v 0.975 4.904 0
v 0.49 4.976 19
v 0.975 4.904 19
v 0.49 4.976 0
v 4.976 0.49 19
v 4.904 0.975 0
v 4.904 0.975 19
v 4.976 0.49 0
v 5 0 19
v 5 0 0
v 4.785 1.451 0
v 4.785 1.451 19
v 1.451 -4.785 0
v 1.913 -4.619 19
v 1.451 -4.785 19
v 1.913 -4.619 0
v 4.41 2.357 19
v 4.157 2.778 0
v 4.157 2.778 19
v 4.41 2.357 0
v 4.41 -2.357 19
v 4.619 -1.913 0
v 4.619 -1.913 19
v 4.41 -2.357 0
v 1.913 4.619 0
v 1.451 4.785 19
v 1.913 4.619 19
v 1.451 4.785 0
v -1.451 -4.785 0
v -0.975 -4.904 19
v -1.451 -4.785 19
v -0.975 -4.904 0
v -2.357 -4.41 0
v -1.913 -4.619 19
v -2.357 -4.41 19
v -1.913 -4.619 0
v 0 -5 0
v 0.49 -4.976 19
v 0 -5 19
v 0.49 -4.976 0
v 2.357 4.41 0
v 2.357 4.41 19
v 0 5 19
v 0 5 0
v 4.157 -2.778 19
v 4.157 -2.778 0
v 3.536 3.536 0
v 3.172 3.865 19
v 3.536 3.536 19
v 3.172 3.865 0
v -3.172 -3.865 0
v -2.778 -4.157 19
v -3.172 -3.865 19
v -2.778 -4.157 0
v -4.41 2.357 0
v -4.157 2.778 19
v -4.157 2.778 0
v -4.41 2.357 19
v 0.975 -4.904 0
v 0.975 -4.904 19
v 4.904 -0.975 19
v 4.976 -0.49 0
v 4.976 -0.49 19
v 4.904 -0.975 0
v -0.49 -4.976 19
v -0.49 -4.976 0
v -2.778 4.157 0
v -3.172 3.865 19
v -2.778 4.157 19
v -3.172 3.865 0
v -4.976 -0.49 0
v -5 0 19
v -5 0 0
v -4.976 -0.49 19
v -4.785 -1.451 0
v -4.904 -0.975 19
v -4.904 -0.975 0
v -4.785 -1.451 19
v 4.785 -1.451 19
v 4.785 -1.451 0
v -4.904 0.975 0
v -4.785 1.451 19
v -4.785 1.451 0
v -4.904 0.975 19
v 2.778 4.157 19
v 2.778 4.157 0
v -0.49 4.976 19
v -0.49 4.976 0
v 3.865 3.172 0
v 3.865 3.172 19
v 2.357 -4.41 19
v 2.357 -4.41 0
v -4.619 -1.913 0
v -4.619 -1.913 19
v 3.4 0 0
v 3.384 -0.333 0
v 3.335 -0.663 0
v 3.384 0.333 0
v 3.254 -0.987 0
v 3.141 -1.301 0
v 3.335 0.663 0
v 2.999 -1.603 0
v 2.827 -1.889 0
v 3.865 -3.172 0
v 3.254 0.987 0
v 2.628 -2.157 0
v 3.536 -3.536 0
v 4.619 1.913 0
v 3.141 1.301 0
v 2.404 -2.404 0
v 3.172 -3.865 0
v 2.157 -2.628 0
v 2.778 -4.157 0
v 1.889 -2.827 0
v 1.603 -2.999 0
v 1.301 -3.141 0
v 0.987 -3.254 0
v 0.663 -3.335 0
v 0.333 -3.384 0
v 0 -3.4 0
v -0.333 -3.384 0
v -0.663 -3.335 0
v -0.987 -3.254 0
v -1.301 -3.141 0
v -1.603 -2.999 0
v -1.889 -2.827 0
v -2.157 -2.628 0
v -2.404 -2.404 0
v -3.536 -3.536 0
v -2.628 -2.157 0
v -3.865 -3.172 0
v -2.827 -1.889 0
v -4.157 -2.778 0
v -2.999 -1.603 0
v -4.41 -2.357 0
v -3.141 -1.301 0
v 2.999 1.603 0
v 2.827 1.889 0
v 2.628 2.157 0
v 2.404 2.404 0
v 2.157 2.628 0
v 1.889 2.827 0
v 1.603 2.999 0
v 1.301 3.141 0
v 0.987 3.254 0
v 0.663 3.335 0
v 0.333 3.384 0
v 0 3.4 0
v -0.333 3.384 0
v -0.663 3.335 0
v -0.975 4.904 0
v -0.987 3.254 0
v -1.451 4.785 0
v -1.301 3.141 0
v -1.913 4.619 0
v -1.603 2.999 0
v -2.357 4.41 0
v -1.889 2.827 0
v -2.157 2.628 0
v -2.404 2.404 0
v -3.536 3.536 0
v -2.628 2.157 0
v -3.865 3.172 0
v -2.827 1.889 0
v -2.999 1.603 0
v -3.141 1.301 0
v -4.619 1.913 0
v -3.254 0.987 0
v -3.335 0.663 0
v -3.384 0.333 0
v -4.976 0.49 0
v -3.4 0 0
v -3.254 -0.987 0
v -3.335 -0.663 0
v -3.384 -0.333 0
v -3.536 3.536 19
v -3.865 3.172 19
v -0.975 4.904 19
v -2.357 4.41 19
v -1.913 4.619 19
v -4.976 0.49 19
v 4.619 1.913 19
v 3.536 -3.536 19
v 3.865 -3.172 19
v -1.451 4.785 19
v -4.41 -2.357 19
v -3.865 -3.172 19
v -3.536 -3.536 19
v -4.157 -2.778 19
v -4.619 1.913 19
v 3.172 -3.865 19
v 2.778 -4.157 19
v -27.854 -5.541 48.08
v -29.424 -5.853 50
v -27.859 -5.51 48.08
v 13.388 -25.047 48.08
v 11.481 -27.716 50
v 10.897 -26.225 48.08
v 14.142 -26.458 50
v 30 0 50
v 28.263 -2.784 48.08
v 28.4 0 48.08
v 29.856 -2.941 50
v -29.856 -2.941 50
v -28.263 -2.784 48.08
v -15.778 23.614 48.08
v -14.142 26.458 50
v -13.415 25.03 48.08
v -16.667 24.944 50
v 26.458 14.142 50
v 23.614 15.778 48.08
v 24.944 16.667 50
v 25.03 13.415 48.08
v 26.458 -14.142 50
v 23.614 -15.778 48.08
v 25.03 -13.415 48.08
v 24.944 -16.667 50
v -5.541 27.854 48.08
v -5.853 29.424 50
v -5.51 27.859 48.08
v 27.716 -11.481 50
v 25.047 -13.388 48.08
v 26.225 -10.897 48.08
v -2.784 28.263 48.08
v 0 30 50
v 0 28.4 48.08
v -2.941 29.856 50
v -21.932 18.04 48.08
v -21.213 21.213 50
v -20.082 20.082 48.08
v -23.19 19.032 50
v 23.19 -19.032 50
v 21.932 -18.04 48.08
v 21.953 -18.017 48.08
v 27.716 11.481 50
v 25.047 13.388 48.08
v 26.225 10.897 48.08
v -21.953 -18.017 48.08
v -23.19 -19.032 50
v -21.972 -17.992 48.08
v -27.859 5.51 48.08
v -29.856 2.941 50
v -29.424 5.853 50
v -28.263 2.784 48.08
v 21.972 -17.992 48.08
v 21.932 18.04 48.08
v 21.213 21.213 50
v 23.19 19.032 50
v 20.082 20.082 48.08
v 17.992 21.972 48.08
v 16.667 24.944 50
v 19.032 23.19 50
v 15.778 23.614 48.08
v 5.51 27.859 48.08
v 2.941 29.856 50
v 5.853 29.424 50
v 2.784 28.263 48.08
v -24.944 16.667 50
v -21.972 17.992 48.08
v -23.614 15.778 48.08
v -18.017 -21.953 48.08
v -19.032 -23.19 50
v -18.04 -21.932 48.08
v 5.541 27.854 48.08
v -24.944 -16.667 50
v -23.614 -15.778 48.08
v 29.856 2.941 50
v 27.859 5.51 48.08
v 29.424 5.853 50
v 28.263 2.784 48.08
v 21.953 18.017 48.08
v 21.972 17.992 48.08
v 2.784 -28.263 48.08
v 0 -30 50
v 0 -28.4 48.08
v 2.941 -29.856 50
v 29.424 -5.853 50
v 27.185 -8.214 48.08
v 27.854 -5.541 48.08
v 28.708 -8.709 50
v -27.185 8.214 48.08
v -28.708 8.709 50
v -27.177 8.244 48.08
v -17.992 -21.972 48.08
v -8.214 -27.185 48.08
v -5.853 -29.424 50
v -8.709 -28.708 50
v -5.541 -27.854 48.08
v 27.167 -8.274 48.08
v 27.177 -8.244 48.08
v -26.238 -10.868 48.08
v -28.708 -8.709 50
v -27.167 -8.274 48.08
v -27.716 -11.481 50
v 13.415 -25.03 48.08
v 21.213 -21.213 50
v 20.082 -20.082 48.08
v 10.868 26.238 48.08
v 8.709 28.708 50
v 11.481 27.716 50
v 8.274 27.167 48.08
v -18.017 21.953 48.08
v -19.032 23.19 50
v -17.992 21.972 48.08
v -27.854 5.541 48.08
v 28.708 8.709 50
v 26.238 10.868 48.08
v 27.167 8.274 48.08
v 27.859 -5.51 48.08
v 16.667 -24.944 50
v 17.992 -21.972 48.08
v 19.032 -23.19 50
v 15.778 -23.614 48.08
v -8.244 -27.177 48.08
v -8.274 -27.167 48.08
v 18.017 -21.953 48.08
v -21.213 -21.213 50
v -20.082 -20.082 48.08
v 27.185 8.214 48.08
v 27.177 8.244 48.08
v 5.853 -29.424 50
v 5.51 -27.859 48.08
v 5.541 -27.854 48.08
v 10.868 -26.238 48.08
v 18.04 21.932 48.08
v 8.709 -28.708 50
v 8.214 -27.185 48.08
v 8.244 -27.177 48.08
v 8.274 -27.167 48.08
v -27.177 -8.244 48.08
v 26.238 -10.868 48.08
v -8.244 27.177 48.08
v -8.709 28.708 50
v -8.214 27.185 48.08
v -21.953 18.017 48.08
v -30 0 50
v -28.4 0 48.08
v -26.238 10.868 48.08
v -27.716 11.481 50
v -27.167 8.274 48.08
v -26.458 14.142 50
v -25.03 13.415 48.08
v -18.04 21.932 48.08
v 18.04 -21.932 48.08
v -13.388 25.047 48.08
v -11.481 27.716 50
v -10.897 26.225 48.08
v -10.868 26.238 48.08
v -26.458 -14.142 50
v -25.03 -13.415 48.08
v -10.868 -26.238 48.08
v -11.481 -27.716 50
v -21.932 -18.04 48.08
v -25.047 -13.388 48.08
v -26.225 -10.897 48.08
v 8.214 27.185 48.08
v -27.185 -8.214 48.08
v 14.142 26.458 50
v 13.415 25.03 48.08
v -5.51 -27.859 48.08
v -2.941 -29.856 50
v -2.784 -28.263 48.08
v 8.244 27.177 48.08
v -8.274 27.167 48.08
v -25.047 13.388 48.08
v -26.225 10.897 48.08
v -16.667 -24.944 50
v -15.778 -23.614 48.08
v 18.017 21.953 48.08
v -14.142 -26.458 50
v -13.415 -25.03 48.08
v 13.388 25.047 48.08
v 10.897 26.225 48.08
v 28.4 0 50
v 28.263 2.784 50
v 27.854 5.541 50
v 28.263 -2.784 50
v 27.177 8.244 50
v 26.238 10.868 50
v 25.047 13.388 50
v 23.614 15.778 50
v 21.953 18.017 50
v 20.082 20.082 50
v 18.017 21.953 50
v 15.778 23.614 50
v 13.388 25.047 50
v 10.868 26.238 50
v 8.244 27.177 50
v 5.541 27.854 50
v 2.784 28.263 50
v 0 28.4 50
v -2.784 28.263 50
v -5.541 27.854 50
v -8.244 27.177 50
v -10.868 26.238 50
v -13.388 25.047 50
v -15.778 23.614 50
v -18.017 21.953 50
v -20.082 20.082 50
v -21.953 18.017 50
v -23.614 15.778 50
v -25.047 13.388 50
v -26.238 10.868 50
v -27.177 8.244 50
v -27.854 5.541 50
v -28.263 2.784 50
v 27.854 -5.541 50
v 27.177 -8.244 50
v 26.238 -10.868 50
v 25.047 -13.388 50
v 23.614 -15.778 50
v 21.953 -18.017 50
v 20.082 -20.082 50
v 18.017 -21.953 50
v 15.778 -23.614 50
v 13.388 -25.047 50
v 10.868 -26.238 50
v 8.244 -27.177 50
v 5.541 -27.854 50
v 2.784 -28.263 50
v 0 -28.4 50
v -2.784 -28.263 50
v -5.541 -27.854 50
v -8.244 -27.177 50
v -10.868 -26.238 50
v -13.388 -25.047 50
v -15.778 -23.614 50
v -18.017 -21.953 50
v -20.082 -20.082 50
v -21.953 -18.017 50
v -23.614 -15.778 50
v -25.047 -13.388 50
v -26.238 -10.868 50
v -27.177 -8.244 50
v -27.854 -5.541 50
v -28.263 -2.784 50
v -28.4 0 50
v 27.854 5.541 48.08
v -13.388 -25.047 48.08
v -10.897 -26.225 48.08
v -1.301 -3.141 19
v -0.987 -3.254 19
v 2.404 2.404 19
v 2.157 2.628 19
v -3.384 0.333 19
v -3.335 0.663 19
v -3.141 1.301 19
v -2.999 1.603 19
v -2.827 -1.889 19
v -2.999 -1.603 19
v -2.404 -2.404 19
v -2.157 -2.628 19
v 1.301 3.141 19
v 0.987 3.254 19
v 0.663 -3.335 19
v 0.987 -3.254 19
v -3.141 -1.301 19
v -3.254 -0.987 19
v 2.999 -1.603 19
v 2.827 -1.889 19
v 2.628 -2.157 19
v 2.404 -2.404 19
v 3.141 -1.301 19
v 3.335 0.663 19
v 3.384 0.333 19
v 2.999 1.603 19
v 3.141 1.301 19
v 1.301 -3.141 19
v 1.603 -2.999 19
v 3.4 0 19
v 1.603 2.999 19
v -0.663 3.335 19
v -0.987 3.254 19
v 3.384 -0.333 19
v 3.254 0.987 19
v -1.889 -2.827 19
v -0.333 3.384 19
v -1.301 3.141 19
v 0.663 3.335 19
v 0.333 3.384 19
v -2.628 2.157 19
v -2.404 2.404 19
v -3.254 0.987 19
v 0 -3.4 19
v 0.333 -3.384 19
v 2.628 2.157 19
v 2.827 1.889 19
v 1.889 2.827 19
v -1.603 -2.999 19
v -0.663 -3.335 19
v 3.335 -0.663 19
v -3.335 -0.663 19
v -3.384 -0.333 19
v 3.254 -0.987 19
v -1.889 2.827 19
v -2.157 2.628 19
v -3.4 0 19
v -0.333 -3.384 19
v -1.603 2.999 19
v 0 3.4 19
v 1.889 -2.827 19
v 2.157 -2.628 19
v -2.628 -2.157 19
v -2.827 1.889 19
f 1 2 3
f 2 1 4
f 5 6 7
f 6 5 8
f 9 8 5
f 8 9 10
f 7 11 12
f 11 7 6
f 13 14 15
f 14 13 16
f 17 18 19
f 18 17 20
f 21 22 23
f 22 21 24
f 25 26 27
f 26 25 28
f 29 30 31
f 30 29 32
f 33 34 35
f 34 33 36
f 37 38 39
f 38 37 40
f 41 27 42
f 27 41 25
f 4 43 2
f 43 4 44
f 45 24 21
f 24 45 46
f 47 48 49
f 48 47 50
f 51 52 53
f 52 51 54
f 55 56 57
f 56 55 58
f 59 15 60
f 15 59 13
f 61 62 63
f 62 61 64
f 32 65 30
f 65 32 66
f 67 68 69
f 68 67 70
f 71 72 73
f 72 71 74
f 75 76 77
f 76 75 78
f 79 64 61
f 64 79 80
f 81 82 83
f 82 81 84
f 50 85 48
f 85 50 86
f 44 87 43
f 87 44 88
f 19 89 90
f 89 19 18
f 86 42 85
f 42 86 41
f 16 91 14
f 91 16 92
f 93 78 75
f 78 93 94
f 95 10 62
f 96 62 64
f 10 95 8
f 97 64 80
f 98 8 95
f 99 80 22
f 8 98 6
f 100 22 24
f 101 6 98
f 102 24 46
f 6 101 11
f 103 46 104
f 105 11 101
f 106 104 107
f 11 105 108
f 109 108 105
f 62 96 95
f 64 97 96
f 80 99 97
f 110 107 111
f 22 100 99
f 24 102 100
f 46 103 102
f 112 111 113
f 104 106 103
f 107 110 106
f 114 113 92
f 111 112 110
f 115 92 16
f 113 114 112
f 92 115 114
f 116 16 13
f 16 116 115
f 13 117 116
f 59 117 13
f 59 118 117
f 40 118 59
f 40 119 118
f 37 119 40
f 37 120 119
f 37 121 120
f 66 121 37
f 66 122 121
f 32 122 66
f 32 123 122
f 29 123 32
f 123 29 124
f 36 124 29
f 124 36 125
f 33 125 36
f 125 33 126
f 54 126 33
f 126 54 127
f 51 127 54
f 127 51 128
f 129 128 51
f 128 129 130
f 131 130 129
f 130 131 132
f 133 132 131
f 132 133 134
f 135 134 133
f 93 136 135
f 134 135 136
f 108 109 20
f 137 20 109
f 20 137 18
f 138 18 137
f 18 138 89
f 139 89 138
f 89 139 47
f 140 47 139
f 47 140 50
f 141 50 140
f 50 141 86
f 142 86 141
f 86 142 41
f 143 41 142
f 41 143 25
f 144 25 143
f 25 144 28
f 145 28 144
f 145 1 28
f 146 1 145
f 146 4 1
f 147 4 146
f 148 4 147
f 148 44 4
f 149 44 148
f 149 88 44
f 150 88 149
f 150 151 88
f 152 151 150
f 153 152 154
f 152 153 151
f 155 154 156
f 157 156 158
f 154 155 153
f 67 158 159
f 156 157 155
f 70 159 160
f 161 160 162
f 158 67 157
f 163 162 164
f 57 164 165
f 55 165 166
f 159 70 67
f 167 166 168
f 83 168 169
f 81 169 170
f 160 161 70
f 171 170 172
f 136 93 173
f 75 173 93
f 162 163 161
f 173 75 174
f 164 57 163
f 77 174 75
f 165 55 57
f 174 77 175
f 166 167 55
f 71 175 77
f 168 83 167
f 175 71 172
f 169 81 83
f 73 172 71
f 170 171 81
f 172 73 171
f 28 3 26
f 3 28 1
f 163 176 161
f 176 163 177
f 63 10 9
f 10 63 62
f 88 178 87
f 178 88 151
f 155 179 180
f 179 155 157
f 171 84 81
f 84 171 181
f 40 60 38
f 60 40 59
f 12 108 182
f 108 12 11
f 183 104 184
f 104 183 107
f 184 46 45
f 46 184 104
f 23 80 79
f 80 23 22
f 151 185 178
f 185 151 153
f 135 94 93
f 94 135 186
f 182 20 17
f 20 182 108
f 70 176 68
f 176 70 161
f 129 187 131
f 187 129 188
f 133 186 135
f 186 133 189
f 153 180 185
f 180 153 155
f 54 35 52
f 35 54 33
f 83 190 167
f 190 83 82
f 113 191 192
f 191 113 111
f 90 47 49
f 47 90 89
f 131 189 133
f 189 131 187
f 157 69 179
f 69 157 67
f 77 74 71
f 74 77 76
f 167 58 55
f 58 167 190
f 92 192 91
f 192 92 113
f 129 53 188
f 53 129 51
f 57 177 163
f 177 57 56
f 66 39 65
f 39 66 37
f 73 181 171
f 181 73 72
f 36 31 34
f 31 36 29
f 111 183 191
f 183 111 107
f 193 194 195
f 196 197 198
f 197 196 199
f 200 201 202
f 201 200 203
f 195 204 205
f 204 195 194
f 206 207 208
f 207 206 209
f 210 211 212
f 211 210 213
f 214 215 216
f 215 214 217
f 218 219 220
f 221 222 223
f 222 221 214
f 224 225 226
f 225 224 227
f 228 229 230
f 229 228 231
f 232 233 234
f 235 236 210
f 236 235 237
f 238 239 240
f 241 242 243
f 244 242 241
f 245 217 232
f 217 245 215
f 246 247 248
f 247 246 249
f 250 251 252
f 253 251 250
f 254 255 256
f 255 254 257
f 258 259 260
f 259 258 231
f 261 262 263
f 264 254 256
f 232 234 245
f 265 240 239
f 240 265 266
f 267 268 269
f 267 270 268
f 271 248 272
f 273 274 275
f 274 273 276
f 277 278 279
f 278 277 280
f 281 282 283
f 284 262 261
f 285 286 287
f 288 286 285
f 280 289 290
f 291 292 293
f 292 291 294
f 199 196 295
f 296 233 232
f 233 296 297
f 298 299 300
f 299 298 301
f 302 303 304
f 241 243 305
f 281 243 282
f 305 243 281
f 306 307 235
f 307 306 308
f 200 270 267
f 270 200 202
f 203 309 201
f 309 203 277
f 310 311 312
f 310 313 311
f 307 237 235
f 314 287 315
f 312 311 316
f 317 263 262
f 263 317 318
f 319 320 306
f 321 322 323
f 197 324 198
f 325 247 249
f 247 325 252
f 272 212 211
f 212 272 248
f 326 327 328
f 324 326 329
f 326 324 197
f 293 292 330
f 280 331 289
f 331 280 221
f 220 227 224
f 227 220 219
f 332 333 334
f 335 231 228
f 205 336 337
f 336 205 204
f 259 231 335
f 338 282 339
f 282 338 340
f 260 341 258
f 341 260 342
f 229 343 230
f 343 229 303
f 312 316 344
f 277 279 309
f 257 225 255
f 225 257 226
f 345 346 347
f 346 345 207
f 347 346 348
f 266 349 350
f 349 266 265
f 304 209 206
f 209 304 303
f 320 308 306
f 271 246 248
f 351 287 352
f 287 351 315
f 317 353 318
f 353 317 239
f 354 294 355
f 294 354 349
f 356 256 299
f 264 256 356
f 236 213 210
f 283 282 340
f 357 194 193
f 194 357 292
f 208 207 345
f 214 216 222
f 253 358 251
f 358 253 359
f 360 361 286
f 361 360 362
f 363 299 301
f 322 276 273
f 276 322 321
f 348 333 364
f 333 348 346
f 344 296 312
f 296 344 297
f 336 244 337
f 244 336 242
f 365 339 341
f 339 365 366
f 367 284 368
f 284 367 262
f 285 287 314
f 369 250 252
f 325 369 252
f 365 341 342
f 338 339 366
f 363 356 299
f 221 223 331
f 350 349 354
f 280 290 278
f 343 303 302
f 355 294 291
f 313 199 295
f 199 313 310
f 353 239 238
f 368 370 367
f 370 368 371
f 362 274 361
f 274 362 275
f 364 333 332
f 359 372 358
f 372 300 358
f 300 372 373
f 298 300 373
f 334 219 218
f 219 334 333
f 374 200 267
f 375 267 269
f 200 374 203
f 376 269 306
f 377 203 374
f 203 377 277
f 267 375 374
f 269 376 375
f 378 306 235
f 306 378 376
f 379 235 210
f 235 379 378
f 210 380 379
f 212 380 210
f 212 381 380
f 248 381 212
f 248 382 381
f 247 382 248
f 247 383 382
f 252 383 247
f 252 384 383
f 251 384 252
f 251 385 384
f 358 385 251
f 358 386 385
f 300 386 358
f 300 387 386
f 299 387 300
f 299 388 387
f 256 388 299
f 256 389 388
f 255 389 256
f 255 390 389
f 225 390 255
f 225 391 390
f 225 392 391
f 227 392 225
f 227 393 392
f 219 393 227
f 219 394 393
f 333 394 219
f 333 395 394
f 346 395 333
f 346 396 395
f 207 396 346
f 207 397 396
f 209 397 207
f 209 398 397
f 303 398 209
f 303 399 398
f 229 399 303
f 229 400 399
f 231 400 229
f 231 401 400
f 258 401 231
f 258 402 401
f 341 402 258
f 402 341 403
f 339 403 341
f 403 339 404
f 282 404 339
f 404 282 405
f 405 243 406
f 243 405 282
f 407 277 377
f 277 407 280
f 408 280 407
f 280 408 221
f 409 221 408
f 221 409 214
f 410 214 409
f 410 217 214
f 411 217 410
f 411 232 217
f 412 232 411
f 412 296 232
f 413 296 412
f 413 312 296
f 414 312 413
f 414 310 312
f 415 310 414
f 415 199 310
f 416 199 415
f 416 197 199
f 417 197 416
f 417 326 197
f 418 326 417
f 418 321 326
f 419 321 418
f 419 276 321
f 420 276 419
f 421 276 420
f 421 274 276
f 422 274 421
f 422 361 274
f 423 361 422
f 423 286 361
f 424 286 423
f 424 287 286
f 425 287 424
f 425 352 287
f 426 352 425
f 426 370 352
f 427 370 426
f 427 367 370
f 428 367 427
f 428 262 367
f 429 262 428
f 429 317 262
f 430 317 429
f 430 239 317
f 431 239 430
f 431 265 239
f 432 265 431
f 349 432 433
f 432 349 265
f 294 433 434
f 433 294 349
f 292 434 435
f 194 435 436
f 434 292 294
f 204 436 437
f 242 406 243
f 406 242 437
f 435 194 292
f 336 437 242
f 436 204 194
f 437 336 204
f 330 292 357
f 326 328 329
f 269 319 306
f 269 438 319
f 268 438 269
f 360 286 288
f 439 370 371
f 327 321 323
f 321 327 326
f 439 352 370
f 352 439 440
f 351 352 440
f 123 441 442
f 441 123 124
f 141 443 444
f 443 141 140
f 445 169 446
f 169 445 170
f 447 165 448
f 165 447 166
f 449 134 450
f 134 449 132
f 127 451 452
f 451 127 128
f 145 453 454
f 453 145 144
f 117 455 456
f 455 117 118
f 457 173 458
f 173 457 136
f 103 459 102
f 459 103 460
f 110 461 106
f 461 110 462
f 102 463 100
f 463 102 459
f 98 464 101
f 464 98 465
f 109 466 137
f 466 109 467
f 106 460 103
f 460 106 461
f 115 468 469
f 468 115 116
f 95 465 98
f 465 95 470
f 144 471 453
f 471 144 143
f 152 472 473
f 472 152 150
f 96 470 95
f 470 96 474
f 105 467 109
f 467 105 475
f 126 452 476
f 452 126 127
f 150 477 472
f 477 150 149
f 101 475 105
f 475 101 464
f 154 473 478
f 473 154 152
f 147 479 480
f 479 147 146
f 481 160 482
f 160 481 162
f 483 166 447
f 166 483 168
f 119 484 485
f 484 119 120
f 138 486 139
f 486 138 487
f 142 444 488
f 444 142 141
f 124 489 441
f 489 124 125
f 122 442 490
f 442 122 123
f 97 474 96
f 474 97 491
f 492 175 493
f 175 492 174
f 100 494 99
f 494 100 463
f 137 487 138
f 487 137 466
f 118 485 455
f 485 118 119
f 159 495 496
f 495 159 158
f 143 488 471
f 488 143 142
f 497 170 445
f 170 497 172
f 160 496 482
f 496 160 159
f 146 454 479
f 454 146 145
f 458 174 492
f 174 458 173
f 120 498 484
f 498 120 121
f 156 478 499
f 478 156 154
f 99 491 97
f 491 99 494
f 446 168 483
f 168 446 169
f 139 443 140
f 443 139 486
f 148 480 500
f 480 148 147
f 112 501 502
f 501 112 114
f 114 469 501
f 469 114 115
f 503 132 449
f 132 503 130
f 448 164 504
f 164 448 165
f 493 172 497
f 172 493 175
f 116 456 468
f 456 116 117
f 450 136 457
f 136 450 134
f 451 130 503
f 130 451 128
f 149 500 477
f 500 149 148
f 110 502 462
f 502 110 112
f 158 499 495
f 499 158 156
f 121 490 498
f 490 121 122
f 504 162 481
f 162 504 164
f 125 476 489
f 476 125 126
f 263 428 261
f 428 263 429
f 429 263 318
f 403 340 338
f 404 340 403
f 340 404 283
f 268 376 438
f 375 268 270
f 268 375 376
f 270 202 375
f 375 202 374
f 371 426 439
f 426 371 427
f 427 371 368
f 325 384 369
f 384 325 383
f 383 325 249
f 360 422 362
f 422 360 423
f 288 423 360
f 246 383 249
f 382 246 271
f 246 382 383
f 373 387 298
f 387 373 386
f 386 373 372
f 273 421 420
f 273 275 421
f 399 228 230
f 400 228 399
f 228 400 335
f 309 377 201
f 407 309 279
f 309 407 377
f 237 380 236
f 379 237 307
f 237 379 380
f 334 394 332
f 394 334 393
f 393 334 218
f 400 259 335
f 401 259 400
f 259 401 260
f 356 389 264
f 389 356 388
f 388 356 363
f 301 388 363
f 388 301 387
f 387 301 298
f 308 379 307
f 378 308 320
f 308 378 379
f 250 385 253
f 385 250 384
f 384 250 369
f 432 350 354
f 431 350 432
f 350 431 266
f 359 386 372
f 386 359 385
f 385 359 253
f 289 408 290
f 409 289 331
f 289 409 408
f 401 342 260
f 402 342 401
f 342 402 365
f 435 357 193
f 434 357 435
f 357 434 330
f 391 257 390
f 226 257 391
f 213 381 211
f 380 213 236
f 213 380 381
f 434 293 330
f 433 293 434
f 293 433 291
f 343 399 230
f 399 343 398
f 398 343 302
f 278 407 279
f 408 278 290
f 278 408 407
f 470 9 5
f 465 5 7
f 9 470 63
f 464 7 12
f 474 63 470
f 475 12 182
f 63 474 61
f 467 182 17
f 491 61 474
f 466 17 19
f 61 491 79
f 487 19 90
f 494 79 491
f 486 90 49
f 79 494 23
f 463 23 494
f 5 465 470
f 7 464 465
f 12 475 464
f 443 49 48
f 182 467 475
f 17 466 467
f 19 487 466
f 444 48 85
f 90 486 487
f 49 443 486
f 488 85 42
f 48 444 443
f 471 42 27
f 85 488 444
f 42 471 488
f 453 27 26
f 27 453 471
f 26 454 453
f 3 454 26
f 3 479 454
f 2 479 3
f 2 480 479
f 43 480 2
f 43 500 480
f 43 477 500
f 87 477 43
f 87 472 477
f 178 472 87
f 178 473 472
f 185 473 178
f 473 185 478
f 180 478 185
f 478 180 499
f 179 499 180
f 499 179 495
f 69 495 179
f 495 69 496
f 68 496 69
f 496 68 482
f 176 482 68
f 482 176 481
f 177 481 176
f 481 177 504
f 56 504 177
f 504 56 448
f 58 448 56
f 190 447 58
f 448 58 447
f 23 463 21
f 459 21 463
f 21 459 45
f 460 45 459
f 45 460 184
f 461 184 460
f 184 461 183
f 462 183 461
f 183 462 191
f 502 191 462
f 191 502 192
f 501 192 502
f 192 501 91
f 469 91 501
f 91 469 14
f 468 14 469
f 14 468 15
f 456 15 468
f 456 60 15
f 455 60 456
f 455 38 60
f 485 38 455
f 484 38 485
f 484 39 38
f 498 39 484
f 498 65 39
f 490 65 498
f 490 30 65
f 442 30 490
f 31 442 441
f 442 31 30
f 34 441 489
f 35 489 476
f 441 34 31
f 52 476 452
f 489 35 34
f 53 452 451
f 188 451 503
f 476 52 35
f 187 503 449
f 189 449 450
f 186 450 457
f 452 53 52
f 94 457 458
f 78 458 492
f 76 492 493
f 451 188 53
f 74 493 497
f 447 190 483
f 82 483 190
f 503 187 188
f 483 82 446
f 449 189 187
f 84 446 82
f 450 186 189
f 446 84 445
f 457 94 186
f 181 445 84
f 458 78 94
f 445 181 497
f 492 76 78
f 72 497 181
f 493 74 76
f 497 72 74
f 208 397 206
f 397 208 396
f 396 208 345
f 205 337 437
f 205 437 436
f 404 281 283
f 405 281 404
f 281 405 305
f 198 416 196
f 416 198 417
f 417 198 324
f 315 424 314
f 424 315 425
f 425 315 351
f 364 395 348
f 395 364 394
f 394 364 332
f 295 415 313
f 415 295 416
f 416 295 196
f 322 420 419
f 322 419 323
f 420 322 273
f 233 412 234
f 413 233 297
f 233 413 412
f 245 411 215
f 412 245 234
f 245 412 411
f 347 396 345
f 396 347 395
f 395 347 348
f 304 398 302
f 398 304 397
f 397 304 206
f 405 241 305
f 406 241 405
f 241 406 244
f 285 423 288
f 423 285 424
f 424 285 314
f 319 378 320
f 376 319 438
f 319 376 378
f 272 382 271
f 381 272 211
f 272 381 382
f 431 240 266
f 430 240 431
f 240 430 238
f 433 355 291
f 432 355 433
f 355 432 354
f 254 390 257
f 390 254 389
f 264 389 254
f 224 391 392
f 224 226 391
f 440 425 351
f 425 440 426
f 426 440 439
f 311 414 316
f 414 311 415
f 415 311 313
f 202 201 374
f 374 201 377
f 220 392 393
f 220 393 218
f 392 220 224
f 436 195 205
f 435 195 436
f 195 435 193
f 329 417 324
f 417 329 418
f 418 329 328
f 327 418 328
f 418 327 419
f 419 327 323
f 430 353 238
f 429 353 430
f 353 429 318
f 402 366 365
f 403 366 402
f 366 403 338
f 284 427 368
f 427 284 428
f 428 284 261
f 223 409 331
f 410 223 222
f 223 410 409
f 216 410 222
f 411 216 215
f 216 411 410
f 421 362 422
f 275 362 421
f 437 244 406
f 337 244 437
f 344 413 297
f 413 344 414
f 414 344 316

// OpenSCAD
// Funnel - a spout (tube) sitting below a conical section, open at both ends for fluid flow.
// NOVEL general part for a lab or craft. DO NOT use in contact with skin or food.
//

spout_d = 10;
spout_l = 20;
cone_d  = 60;
wall    = 1.6;

$fn = 64;

ib = spout_d - 2 * wall;   // spout bore
ic = cone_d - 2 * wall;    // cone inner diameter at the spout join

difference() {
    union() {
        cylinder(h = spout_l, d = spout_d);                 // spout
        translate([0, 0, spout_l]) cylinder(h = 30, d1 = spout_d, d2 = cone_d);  // cone
    }
    translate([0, 0, -1]) cylinder(h = spout_l + 2, d = ib);                     // spout bore
    translate([0, 0, spout_l - 1]) cylinder(h = 32, d = ic);                     // cone inner space
}
